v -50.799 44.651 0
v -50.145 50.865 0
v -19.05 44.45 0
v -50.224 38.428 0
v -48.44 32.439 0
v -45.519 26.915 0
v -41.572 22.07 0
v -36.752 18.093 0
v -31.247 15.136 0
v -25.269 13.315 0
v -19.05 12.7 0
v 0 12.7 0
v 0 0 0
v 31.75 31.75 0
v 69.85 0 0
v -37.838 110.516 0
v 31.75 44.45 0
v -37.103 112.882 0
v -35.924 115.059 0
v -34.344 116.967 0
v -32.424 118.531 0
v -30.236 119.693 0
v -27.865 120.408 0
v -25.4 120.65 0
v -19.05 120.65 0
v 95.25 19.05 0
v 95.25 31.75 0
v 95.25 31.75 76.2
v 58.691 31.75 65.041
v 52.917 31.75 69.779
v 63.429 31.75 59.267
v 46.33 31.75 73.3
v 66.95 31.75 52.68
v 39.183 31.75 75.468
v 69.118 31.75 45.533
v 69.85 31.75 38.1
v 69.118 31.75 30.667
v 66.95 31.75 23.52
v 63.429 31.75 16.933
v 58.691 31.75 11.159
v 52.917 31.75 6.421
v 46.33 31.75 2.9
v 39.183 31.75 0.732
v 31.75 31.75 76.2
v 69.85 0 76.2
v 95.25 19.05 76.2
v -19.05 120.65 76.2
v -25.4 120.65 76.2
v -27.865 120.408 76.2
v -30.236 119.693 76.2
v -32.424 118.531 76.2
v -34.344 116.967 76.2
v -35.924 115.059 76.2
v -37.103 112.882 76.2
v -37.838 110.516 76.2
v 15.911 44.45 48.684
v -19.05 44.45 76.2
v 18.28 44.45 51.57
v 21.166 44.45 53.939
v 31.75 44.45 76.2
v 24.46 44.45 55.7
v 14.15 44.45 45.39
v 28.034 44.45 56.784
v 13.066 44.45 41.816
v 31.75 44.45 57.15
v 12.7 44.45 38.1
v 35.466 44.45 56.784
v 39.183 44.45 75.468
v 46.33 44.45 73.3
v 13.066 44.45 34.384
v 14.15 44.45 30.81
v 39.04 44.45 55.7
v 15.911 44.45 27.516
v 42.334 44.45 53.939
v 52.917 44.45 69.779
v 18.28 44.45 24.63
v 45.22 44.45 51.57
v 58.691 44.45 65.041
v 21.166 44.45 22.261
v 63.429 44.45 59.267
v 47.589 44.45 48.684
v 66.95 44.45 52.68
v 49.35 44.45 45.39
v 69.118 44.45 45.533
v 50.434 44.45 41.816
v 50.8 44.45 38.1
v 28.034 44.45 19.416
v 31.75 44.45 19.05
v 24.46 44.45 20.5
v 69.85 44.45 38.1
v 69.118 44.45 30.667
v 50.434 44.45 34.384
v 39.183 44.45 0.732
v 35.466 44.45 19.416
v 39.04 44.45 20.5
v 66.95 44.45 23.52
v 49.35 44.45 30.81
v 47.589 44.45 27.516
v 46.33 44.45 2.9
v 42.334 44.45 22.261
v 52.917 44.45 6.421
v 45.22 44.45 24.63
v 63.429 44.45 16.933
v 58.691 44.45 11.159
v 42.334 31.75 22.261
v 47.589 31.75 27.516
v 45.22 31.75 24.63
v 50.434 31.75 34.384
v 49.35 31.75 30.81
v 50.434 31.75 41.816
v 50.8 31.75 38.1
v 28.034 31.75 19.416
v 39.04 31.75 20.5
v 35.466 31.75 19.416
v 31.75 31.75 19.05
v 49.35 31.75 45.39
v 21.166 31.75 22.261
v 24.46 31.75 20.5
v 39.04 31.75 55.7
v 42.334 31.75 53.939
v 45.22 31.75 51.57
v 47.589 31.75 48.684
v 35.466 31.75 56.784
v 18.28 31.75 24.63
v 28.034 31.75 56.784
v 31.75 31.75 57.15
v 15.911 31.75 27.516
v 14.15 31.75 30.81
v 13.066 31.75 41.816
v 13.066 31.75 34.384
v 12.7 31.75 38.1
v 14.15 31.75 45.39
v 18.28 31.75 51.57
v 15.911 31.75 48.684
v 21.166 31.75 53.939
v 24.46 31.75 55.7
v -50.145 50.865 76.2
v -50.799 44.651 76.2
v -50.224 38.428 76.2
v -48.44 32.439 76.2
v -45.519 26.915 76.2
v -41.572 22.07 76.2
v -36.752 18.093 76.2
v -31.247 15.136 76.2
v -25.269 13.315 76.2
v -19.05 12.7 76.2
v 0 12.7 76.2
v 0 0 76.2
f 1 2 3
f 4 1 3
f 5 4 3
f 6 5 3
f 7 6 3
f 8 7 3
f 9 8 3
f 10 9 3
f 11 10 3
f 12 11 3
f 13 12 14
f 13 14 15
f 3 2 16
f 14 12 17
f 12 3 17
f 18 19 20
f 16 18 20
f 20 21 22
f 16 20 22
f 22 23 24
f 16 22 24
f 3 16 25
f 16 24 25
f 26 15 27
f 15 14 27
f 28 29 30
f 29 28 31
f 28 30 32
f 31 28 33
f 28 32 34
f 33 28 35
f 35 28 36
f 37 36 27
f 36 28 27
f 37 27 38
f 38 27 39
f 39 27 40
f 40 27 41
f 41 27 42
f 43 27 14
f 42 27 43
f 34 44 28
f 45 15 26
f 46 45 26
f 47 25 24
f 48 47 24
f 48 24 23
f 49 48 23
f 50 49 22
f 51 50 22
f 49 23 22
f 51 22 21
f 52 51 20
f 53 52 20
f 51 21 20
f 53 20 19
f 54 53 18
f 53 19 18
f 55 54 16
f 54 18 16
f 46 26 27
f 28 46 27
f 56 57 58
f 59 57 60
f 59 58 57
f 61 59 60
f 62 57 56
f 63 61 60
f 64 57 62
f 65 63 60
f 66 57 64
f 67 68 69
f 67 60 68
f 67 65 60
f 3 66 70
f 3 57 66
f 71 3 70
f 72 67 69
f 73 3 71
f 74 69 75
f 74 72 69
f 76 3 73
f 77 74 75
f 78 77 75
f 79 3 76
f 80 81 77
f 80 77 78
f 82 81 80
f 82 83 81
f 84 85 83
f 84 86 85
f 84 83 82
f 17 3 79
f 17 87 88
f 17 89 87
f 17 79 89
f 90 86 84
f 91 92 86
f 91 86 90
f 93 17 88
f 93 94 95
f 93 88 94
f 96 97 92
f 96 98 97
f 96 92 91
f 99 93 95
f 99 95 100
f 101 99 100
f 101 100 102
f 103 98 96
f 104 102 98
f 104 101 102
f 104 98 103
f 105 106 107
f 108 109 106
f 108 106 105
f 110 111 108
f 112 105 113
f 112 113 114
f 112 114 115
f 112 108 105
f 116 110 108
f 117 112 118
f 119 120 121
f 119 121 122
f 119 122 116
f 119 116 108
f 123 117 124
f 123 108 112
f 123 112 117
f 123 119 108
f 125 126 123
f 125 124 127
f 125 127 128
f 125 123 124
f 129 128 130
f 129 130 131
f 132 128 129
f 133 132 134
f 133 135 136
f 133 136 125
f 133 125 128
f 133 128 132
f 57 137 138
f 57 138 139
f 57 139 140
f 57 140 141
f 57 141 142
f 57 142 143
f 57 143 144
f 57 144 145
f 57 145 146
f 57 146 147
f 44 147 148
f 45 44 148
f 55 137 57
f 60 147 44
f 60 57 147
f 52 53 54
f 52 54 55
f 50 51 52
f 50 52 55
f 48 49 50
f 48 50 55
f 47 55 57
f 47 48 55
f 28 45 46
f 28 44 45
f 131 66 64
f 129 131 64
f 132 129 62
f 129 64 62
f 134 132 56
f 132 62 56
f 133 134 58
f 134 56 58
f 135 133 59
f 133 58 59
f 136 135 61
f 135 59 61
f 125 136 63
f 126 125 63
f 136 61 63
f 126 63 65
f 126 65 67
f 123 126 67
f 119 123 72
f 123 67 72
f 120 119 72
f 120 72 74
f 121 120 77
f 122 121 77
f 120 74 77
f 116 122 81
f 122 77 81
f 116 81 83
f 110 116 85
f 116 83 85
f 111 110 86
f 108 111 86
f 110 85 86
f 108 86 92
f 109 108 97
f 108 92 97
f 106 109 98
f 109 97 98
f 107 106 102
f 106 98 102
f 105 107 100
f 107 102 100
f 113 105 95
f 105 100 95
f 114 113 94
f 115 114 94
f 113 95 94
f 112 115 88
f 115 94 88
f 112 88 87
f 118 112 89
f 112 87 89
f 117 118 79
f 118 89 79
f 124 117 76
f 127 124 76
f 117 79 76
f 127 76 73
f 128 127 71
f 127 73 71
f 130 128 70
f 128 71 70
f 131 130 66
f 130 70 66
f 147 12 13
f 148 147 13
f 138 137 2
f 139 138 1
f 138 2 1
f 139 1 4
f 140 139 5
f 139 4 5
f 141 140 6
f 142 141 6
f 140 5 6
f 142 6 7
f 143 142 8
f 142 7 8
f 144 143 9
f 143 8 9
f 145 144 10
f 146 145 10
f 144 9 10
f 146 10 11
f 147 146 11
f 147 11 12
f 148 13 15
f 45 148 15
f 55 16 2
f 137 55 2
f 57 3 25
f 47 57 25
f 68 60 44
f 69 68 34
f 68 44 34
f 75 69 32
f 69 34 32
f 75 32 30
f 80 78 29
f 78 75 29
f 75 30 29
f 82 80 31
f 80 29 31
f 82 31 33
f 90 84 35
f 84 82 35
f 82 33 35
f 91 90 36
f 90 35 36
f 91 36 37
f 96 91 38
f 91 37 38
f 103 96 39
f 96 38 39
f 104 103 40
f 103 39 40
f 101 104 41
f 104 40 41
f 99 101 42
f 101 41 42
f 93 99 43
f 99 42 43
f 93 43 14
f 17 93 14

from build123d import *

# Parameters (mm, degrees)
BOSS_EXTRUDE1_DEPTH = 76.2
SKETCH3_R           = 38.1
BOSS_EXTRUDE2_DEPTH = 12.7
SKETCH4_R           = 19.05
CUT_EXTRUDE1_DEPTH  = 12.7


with BuildPart() as part:
    # Sketch1 → Boss-Extrude1 (new body)
    with BuildSketch(Plane.XY):
        with BuildLine():
            Line((0, 0), (69.85, 0))
            Line((69.85, 0), (95.25, 19.05))
            Line((95.25, 19.05), (95.25, 31.75))
            Line((95.25, 31.75), (31.75, 31.75))
            Line((31.75, 31.75), (31.75, 44.45))
            Line((31.75, 44.45), (-19.05, 44.45))
            Line((-19.05, 44.45), (-19.05, 120.65))
            Line((-19.05, 120.65), (-25.4, 120.65))
            ThreePointArc((-25.4, 120.65), (-33.421823369, 117.795829058), (-37.838031752, 110.516196825))
            Line((-37.838031752, 110.516196825), (-50.145079379, 50.865492062))
            ThreePointArc((-50.145079379, 50.865492062), (-43.664572645, 24.395441578), (-19.05, 12.7))
            Line((-19.05, 12.7), (0, 12.7))
            Line((0, 12.7), (0, 0))
        make_face()
    extrude(amount=BOSS_EXTRUDE1_DEPTH)

    # Sketch3 → Boss-Extrude2 (add)
    with BuildSketch(Plane(origin=(0, 31.75, 0), x_dir=(1, 0, 0), z_dir=(0, 1, 0))):
        with Locations((31.75, -38.1)):
            Circle(SKETCH3_R)
    extrude(amount=BOSS_EXTRUDE2_DEPTH)

    # Sketch4 → Cut-Extrude1 (cut)
    with BuildSketch(Plane(origin=(0, 44.45, 0), x_dir=(1, 0, 0), z_dir=(0, 1, 0))):
        with Locations(Location((31.75, -38.1, 0), (0, 0, 180))):
            Circle(SKETCH4_R)
    extrude(amount=-CUT_EXTRUDE1_DEPTH, mode=Mode.SUBTRACT)


solid = part.part
